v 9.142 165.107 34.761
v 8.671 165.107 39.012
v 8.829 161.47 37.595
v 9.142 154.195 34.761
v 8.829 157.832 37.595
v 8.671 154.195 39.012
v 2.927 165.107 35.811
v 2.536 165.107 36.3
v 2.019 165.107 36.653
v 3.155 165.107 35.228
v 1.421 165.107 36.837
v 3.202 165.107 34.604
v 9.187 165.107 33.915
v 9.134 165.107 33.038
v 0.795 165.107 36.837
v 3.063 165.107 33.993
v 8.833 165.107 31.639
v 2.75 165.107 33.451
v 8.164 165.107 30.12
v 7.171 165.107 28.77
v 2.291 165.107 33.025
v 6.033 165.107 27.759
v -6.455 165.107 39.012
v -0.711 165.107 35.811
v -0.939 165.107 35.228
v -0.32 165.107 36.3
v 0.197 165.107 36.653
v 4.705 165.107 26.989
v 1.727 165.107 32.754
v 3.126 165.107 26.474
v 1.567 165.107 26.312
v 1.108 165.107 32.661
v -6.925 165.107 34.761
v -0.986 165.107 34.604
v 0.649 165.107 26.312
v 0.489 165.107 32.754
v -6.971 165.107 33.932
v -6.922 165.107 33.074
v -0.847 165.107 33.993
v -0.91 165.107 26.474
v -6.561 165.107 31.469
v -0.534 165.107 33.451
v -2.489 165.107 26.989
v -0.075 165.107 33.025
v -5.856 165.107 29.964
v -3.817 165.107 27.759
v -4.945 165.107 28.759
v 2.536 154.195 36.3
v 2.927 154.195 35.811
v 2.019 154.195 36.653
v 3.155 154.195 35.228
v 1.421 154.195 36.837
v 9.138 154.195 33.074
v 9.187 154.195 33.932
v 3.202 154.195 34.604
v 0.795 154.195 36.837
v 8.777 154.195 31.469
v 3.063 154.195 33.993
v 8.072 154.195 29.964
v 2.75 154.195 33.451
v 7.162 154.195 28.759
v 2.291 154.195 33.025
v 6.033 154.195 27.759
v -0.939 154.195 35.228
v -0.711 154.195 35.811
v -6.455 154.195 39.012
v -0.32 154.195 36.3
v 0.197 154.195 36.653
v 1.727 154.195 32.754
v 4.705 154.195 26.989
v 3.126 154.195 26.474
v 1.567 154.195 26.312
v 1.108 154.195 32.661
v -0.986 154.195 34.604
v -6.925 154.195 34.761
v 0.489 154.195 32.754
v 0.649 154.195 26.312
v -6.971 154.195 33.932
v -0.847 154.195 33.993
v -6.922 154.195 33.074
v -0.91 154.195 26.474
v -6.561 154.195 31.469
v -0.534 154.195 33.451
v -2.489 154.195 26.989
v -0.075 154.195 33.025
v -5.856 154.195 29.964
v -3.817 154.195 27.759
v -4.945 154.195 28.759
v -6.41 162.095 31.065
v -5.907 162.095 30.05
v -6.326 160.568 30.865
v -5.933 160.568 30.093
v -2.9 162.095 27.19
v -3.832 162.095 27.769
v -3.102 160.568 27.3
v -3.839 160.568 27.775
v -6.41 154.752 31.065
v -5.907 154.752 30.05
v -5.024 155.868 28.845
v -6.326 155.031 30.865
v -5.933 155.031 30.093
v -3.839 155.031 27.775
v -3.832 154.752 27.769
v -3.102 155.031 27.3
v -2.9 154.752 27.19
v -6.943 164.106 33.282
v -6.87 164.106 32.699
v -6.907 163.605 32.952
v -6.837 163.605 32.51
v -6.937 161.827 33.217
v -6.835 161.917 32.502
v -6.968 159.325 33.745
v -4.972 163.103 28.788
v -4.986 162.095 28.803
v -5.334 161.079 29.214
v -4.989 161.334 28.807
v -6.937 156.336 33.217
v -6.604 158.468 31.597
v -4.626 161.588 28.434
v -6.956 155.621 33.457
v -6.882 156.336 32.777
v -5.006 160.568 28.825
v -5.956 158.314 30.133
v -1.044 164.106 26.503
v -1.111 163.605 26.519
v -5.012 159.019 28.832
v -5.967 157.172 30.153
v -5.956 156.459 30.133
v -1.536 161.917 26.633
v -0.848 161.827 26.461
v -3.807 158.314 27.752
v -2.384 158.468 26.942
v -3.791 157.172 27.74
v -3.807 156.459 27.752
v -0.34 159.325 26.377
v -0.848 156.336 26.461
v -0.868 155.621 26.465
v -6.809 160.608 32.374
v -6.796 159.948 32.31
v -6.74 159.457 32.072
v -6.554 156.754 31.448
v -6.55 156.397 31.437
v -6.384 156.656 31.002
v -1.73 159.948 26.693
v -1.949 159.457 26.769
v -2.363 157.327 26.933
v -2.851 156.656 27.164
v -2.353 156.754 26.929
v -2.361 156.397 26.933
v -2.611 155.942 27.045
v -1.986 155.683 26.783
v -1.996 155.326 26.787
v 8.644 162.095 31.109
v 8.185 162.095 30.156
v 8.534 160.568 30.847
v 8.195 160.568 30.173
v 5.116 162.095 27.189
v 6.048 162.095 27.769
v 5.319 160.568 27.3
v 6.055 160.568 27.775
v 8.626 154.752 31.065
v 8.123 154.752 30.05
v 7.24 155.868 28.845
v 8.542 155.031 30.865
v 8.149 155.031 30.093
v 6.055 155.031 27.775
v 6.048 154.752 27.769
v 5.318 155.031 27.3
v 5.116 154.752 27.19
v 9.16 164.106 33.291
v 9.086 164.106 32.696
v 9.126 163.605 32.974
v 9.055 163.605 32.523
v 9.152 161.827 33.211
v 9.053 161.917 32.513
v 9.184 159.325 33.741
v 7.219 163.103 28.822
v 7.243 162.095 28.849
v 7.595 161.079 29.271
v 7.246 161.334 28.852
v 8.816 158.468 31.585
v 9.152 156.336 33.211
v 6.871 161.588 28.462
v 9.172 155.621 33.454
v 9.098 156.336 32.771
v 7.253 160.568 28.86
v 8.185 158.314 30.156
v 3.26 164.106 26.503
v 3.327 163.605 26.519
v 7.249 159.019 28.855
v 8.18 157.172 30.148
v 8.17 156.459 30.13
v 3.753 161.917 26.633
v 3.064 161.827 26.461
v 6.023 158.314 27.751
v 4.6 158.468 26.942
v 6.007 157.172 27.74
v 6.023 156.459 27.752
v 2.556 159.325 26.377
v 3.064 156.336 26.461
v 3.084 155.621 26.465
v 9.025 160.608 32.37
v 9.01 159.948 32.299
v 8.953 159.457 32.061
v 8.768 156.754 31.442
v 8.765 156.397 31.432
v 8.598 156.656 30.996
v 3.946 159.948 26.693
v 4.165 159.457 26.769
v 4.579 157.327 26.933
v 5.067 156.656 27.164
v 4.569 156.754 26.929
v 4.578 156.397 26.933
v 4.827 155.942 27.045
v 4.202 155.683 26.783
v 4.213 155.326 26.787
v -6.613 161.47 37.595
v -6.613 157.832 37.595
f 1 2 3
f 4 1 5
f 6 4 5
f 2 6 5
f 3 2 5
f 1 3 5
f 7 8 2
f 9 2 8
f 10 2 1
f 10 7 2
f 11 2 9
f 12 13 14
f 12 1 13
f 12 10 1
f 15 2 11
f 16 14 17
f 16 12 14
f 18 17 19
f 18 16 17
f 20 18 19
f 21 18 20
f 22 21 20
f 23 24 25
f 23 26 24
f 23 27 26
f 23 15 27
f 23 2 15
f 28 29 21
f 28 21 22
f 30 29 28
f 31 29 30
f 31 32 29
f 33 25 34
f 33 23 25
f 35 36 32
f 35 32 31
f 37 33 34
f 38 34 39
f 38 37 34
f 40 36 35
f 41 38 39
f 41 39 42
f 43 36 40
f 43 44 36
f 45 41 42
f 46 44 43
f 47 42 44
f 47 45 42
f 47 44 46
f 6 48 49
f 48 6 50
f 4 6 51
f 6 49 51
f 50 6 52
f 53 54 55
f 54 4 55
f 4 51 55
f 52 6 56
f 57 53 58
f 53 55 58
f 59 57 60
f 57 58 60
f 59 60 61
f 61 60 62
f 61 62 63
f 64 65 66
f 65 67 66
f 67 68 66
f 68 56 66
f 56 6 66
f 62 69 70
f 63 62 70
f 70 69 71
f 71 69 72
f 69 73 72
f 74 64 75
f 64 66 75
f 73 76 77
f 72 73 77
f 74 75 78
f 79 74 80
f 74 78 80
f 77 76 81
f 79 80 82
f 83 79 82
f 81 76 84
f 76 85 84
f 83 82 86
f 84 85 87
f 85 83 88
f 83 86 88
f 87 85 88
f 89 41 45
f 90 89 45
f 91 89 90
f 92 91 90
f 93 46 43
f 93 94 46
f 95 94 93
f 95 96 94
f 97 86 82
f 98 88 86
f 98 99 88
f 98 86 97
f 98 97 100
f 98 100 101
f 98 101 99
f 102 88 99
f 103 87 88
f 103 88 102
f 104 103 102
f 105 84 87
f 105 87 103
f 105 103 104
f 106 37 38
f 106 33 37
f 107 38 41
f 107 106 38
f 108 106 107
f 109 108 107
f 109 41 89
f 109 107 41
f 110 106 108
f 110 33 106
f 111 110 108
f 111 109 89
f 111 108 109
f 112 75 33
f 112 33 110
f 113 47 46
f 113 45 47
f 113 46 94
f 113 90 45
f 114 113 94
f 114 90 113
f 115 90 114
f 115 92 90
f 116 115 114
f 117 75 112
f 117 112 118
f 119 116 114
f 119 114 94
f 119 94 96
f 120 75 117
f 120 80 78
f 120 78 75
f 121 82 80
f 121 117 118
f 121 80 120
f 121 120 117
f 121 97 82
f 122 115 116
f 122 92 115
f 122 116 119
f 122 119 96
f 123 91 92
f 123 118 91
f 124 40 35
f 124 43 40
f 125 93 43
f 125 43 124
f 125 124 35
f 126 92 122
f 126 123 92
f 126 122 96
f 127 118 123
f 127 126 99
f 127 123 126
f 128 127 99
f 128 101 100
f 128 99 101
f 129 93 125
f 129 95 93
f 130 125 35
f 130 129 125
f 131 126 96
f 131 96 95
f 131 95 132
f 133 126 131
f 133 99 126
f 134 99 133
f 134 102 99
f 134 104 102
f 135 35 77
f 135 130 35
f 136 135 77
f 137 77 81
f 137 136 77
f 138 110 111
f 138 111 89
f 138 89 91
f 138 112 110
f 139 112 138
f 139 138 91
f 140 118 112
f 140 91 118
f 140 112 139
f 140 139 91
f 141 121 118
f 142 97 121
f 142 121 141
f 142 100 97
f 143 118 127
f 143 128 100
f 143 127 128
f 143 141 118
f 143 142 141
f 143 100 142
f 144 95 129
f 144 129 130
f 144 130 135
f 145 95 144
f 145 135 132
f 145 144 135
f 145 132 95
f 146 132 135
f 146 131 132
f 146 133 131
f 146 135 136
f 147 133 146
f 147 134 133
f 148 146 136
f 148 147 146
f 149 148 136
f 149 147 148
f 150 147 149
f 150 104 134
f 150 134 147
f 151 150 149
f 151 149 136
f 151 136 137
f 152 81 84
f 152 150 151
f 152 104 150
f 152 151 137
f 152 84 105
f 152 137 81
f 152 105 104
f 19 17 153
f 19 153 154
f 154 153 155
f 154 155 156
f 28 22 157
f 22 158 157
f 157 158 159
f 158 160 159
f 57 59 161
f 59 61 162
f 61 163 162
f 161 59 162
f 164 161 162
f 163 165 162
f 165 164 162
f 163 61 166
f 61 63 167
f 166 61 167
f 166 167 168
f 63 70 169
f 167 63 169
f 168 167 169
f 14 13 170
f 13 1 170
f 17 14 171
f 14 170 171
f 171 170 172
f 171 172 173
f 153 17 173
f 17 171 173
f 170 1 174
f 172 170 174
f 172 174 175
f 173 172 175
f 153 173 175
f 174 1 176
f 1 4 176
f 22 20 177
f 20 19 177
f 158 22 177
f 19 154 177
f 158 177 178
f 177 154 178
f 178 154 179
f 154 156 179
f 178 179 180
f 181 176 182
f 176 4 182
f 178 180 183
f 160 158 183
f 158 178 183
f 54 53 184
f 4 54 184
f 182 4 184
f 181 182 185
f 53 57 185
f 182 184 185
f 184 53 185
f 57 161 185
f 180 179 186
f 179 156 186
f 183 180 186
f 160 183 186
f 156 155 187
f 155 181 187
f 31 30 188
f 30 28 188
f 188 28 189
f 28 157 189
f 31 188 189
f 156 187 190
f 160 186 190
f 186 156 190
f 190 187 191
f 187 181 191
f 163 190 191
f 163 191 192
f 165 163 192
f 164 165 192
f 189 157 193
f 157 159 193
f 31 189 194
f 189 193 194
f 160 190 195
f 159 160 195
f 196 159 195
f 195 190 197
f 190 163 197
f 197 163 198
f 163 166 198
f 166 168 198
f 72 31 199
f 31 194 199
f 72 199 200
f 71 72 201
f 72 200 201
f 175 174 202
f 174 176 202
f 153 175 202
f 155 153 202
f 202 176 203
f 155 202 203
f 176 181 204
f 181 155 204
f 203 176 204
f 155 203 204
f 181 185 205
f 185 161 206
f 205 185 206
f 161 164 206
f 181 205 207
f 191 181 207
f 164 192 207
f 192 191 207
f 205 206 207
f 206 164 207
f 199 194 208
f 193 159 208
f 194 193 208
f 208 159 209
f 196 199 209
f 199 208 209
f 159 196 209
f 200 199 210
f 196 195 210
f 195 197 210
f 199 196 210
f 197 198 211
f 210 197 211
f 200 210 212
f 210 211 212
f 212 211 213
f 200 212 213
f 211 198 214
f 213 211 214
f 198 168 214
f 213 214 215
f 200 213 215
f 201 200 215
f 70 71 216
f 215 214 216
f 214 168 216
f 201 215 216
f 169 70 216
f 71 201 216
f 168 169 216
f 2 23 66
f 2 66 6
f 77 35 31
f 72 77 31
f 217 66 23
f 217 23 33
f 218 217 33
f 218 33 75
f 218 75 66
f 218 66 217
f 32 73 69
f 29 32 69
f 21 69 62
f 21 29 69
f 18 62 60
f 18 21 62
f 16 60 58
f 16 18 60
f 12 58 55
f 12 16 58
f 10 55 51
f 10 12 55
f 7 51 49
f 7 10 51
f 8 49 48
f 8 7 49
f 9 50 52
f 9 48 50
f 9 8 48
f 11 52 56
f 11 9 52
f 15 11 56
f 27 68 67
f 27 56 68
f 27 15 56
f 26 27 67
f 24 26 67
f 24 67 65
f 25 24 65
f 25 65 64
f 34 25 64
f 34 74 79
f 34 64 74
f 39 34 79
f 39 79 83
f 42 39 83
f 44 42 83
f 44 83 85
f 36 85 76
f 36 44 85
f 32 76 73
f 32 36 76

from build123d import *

# Parameters (mm, degrees)
SKETCH1_R               = 1.984375
BOSS_EXTRUDE1_DEPTH     = 169.87266
SKETCH2_W               = 35.763807095
SKETCH2_H               = 22.705005105
CUT_EXTRUDE1_DEPTH      = 23.05812
CUT_EXTRUDE2_START      = -169.87266
SKETCH2_2_W             = 35.763807095
SKETCH2_2_H             = 22.705005105
CUT_EXTRUDE2_DEPTH      = 23.05812
FILLET1_R               = 7.62
CUT_EXTRUDE3_DEPTH      = 198.390942599
CUT_EXTRUDE3_DEPTH_BACK = 198.390942599
SKETCH6_R               = 2.1
CUT_EXTRUDE4_DEPTH      = 198.390942599
CUT_EXTRUDE4_DEPTH_BACK = 198.390942599
SKETCH7_W               = 96.266326783
SKETCH7_H               = 154.195082356
SKETCH7_H_2             = 4.765737644
CUT_EXTRUDE5_DEPTH      = 101.887240685
CUT_EXTRUDE5_DEPTH_BACK = 101.887240685
SKETCH8_W               = 55.334278697
SKETCH8_H               = 64.985105724


with BuildPart() as part:
    # Sketch1 → Boss-Extrude1 (new body)
    with BuildSketch(Plane(origin=(0, 0, 0), x_dir=(1, 0, 0), z_dir=(0, 1, 0))):
        with BuildLine():
            Line((-9.955287346, -3.607451573), (-6.769721368, -3.607451573))
            Line((-6.769721368, -3.607451573), (8.985913589, -3.607451573))
            Line((8.985913589, -3.607451573), (12.171479568, -3.607451573))
            add(Edge.make_bspline(
                [(10.60289965, -20.752451573), (11.099968974, -15.730201571), (11.630563617, -10.016003166), (12.113997871, -4.296816952), (12.171479568, -3.607451573)],
                knots=[0.384969626, 0.384969626, 0.384969626, 0.384969626, 0.458108671, 0.468131593, 0.468131593, 0.468131593, 0.468131593], degree=3))
            add(Edge.make_bspline(
                [(1.108096111, -99.873778356), (4.527344744, -73.531764163), (7.9865599, -47.187219652), (10.60289965, -20.752451573)],
                knots=[0, 0, 0, 0, 0.384969626, 0.384969626, 0.384969626, 0.384969626], degree=3))
            add(Edge.make_bspline(
                [(1.108096111, -99.873778356), (-2.311152522, -73.531764163), (-5.770367679, -47.187219652), (-8.386707429, -20.752451573)],
                knots=[0, 0, 0, 0, 0.384969626, 0.384969626, 0.384969626, 0.384969626], degree=3))
            add(Edge.make_bspline(
                [(-8.386707429, -20.752451573), (-8.883776753, -15.730201571), (-9.414371396, -10.016003166), (-9.89780565, -4.296816952), (-9.955287346, -3.607451573)],
                knots=[0.384969626, 0.384969626, 0.384969626, 0.384969626, 0.458108671, 0.468131593, 0.468131593, 0.468131593, 0.468131593], degree=3))
        make_face()
        with Locations(Location((1.108108569, -11.326456678, 0), (0, 0, 270))):
            Circle(SKETCH1_R, mode=Mode.SUBTRACT)
    extrude(amount=BOSS_EXTRUDE1_DEPTH)

    # Sketch2 → Cut-Extrude1 (cut)
    with BuildSketch(Plane(origin=(0, 169.87266, 0), x_dir=(1, 0, 0), z_dir=(0, 1, 0))):
        with Locations((7.926616202, -14.959954125)):
            Rectangle(SKETCH2_W, SKETCH2_H)
    extrude(amount=-CUT_EXTRUDE1_DEPTH, mode=Mode.SUBTRACT)

    # Sketch2<2> → Cut-Extrude2 (cut)
    with BuildSketch(Plane(origin=(0, 169.87266, 0), x_dir=(1, 0, 0), z_dir=(0, 1, 0)).offset(CUT_EXTRUDE2_START)):
        with Locations((7.926616202, -14.959954125)):
            Rectangle(SKETCH2_2_W, SKETCH2_2_H)
    extrude(amount=CUT_EXTRUDE2_DEPTH, mode=Mode.SUBTRACT)

    # Fillet1
    fillet1_edges = [part.edges().sort_by_distance(p)[0] for p in [
        (-7.824155374, 11.52906, 26.312456678),
        (10.040347595, 11.52906, 26.312456678),
        (-9.955287346, 84.93633, 3.607451573),
        (12.171479568, 84.93633, 3.607451573),
        (-7.824155374, 158.3436, 26.312456678),
        (10.040347595, 158.3436, 26.312456678),
    ]]
    fillet(fillet1_edges, radius=FILLET1_R)

    # Sketch6 → Cut-Extrude3 (cut, two sides: drawn at the far end of the back side and taken through both)
    with BuildSketch(Plane.XZ.offset(-CUT_EXTRUDE3_DEPTH_BACK)):
        with Locations(Location((1.108096111, 71.933778356, 0), (0, 0, 270))):
            Circle(SKETCH6_R)
        with Locations(Location((1.108096111, 34.760552137, 0), (0, 0, 270))):
            Circle(SKETCH6_R)
    extrude(amount=CUT_EXTRUDE3_DEPTH + CUT_EXTRUDE3_DEPTH_BACK, mode=Mode.SUBTRACT)

    # Sketch7 → Cut-Extrude4 (cut, two sides: drawn at the far end of the back side and taken through both)
    with BuildSketch(Plane(origin=(0, 0, 0), x_dir=(0, 0, -1), z_dir=(1, 0, 0)).offset(-CUT_EXTRUDE4_DEPTH_BACK)):
        with Locations((-51.740614965, 77.097541178)):
            Rectangle(SKETCH7_W, SKETCH7_H)
        with Locations((-51.740614965, 167.489791178)):
            Rectangle(SKETCH7_W, SKETCH7_H_2)
    extrude(amount=CUT_EXTRUDE4_DEPTH + CUT_EXTRUDE4_DEPTH_BACK, mode=Mode.SUBTRACT)

    # Sketch8 → Cut-Extrude5 (cut, two sides: drawn at the far end of the back side and taken through both)
    with BuildSketch(Plane.XZ.offset(-154.195082356).offset(-CUT_EXTRUDE5_DEPTH_BACK)):
        with Locations((-8.071043379, 71.50500954)):
            Rectangle(SKETCH8_W, SKETCH8_H)
    extrude(amount=CUT_EXTRUDE5_DEPTH + CUT_EXTRUDE5_DEPTH_BACK, mode=Mode.SUBTRACT)


solid = part.part
